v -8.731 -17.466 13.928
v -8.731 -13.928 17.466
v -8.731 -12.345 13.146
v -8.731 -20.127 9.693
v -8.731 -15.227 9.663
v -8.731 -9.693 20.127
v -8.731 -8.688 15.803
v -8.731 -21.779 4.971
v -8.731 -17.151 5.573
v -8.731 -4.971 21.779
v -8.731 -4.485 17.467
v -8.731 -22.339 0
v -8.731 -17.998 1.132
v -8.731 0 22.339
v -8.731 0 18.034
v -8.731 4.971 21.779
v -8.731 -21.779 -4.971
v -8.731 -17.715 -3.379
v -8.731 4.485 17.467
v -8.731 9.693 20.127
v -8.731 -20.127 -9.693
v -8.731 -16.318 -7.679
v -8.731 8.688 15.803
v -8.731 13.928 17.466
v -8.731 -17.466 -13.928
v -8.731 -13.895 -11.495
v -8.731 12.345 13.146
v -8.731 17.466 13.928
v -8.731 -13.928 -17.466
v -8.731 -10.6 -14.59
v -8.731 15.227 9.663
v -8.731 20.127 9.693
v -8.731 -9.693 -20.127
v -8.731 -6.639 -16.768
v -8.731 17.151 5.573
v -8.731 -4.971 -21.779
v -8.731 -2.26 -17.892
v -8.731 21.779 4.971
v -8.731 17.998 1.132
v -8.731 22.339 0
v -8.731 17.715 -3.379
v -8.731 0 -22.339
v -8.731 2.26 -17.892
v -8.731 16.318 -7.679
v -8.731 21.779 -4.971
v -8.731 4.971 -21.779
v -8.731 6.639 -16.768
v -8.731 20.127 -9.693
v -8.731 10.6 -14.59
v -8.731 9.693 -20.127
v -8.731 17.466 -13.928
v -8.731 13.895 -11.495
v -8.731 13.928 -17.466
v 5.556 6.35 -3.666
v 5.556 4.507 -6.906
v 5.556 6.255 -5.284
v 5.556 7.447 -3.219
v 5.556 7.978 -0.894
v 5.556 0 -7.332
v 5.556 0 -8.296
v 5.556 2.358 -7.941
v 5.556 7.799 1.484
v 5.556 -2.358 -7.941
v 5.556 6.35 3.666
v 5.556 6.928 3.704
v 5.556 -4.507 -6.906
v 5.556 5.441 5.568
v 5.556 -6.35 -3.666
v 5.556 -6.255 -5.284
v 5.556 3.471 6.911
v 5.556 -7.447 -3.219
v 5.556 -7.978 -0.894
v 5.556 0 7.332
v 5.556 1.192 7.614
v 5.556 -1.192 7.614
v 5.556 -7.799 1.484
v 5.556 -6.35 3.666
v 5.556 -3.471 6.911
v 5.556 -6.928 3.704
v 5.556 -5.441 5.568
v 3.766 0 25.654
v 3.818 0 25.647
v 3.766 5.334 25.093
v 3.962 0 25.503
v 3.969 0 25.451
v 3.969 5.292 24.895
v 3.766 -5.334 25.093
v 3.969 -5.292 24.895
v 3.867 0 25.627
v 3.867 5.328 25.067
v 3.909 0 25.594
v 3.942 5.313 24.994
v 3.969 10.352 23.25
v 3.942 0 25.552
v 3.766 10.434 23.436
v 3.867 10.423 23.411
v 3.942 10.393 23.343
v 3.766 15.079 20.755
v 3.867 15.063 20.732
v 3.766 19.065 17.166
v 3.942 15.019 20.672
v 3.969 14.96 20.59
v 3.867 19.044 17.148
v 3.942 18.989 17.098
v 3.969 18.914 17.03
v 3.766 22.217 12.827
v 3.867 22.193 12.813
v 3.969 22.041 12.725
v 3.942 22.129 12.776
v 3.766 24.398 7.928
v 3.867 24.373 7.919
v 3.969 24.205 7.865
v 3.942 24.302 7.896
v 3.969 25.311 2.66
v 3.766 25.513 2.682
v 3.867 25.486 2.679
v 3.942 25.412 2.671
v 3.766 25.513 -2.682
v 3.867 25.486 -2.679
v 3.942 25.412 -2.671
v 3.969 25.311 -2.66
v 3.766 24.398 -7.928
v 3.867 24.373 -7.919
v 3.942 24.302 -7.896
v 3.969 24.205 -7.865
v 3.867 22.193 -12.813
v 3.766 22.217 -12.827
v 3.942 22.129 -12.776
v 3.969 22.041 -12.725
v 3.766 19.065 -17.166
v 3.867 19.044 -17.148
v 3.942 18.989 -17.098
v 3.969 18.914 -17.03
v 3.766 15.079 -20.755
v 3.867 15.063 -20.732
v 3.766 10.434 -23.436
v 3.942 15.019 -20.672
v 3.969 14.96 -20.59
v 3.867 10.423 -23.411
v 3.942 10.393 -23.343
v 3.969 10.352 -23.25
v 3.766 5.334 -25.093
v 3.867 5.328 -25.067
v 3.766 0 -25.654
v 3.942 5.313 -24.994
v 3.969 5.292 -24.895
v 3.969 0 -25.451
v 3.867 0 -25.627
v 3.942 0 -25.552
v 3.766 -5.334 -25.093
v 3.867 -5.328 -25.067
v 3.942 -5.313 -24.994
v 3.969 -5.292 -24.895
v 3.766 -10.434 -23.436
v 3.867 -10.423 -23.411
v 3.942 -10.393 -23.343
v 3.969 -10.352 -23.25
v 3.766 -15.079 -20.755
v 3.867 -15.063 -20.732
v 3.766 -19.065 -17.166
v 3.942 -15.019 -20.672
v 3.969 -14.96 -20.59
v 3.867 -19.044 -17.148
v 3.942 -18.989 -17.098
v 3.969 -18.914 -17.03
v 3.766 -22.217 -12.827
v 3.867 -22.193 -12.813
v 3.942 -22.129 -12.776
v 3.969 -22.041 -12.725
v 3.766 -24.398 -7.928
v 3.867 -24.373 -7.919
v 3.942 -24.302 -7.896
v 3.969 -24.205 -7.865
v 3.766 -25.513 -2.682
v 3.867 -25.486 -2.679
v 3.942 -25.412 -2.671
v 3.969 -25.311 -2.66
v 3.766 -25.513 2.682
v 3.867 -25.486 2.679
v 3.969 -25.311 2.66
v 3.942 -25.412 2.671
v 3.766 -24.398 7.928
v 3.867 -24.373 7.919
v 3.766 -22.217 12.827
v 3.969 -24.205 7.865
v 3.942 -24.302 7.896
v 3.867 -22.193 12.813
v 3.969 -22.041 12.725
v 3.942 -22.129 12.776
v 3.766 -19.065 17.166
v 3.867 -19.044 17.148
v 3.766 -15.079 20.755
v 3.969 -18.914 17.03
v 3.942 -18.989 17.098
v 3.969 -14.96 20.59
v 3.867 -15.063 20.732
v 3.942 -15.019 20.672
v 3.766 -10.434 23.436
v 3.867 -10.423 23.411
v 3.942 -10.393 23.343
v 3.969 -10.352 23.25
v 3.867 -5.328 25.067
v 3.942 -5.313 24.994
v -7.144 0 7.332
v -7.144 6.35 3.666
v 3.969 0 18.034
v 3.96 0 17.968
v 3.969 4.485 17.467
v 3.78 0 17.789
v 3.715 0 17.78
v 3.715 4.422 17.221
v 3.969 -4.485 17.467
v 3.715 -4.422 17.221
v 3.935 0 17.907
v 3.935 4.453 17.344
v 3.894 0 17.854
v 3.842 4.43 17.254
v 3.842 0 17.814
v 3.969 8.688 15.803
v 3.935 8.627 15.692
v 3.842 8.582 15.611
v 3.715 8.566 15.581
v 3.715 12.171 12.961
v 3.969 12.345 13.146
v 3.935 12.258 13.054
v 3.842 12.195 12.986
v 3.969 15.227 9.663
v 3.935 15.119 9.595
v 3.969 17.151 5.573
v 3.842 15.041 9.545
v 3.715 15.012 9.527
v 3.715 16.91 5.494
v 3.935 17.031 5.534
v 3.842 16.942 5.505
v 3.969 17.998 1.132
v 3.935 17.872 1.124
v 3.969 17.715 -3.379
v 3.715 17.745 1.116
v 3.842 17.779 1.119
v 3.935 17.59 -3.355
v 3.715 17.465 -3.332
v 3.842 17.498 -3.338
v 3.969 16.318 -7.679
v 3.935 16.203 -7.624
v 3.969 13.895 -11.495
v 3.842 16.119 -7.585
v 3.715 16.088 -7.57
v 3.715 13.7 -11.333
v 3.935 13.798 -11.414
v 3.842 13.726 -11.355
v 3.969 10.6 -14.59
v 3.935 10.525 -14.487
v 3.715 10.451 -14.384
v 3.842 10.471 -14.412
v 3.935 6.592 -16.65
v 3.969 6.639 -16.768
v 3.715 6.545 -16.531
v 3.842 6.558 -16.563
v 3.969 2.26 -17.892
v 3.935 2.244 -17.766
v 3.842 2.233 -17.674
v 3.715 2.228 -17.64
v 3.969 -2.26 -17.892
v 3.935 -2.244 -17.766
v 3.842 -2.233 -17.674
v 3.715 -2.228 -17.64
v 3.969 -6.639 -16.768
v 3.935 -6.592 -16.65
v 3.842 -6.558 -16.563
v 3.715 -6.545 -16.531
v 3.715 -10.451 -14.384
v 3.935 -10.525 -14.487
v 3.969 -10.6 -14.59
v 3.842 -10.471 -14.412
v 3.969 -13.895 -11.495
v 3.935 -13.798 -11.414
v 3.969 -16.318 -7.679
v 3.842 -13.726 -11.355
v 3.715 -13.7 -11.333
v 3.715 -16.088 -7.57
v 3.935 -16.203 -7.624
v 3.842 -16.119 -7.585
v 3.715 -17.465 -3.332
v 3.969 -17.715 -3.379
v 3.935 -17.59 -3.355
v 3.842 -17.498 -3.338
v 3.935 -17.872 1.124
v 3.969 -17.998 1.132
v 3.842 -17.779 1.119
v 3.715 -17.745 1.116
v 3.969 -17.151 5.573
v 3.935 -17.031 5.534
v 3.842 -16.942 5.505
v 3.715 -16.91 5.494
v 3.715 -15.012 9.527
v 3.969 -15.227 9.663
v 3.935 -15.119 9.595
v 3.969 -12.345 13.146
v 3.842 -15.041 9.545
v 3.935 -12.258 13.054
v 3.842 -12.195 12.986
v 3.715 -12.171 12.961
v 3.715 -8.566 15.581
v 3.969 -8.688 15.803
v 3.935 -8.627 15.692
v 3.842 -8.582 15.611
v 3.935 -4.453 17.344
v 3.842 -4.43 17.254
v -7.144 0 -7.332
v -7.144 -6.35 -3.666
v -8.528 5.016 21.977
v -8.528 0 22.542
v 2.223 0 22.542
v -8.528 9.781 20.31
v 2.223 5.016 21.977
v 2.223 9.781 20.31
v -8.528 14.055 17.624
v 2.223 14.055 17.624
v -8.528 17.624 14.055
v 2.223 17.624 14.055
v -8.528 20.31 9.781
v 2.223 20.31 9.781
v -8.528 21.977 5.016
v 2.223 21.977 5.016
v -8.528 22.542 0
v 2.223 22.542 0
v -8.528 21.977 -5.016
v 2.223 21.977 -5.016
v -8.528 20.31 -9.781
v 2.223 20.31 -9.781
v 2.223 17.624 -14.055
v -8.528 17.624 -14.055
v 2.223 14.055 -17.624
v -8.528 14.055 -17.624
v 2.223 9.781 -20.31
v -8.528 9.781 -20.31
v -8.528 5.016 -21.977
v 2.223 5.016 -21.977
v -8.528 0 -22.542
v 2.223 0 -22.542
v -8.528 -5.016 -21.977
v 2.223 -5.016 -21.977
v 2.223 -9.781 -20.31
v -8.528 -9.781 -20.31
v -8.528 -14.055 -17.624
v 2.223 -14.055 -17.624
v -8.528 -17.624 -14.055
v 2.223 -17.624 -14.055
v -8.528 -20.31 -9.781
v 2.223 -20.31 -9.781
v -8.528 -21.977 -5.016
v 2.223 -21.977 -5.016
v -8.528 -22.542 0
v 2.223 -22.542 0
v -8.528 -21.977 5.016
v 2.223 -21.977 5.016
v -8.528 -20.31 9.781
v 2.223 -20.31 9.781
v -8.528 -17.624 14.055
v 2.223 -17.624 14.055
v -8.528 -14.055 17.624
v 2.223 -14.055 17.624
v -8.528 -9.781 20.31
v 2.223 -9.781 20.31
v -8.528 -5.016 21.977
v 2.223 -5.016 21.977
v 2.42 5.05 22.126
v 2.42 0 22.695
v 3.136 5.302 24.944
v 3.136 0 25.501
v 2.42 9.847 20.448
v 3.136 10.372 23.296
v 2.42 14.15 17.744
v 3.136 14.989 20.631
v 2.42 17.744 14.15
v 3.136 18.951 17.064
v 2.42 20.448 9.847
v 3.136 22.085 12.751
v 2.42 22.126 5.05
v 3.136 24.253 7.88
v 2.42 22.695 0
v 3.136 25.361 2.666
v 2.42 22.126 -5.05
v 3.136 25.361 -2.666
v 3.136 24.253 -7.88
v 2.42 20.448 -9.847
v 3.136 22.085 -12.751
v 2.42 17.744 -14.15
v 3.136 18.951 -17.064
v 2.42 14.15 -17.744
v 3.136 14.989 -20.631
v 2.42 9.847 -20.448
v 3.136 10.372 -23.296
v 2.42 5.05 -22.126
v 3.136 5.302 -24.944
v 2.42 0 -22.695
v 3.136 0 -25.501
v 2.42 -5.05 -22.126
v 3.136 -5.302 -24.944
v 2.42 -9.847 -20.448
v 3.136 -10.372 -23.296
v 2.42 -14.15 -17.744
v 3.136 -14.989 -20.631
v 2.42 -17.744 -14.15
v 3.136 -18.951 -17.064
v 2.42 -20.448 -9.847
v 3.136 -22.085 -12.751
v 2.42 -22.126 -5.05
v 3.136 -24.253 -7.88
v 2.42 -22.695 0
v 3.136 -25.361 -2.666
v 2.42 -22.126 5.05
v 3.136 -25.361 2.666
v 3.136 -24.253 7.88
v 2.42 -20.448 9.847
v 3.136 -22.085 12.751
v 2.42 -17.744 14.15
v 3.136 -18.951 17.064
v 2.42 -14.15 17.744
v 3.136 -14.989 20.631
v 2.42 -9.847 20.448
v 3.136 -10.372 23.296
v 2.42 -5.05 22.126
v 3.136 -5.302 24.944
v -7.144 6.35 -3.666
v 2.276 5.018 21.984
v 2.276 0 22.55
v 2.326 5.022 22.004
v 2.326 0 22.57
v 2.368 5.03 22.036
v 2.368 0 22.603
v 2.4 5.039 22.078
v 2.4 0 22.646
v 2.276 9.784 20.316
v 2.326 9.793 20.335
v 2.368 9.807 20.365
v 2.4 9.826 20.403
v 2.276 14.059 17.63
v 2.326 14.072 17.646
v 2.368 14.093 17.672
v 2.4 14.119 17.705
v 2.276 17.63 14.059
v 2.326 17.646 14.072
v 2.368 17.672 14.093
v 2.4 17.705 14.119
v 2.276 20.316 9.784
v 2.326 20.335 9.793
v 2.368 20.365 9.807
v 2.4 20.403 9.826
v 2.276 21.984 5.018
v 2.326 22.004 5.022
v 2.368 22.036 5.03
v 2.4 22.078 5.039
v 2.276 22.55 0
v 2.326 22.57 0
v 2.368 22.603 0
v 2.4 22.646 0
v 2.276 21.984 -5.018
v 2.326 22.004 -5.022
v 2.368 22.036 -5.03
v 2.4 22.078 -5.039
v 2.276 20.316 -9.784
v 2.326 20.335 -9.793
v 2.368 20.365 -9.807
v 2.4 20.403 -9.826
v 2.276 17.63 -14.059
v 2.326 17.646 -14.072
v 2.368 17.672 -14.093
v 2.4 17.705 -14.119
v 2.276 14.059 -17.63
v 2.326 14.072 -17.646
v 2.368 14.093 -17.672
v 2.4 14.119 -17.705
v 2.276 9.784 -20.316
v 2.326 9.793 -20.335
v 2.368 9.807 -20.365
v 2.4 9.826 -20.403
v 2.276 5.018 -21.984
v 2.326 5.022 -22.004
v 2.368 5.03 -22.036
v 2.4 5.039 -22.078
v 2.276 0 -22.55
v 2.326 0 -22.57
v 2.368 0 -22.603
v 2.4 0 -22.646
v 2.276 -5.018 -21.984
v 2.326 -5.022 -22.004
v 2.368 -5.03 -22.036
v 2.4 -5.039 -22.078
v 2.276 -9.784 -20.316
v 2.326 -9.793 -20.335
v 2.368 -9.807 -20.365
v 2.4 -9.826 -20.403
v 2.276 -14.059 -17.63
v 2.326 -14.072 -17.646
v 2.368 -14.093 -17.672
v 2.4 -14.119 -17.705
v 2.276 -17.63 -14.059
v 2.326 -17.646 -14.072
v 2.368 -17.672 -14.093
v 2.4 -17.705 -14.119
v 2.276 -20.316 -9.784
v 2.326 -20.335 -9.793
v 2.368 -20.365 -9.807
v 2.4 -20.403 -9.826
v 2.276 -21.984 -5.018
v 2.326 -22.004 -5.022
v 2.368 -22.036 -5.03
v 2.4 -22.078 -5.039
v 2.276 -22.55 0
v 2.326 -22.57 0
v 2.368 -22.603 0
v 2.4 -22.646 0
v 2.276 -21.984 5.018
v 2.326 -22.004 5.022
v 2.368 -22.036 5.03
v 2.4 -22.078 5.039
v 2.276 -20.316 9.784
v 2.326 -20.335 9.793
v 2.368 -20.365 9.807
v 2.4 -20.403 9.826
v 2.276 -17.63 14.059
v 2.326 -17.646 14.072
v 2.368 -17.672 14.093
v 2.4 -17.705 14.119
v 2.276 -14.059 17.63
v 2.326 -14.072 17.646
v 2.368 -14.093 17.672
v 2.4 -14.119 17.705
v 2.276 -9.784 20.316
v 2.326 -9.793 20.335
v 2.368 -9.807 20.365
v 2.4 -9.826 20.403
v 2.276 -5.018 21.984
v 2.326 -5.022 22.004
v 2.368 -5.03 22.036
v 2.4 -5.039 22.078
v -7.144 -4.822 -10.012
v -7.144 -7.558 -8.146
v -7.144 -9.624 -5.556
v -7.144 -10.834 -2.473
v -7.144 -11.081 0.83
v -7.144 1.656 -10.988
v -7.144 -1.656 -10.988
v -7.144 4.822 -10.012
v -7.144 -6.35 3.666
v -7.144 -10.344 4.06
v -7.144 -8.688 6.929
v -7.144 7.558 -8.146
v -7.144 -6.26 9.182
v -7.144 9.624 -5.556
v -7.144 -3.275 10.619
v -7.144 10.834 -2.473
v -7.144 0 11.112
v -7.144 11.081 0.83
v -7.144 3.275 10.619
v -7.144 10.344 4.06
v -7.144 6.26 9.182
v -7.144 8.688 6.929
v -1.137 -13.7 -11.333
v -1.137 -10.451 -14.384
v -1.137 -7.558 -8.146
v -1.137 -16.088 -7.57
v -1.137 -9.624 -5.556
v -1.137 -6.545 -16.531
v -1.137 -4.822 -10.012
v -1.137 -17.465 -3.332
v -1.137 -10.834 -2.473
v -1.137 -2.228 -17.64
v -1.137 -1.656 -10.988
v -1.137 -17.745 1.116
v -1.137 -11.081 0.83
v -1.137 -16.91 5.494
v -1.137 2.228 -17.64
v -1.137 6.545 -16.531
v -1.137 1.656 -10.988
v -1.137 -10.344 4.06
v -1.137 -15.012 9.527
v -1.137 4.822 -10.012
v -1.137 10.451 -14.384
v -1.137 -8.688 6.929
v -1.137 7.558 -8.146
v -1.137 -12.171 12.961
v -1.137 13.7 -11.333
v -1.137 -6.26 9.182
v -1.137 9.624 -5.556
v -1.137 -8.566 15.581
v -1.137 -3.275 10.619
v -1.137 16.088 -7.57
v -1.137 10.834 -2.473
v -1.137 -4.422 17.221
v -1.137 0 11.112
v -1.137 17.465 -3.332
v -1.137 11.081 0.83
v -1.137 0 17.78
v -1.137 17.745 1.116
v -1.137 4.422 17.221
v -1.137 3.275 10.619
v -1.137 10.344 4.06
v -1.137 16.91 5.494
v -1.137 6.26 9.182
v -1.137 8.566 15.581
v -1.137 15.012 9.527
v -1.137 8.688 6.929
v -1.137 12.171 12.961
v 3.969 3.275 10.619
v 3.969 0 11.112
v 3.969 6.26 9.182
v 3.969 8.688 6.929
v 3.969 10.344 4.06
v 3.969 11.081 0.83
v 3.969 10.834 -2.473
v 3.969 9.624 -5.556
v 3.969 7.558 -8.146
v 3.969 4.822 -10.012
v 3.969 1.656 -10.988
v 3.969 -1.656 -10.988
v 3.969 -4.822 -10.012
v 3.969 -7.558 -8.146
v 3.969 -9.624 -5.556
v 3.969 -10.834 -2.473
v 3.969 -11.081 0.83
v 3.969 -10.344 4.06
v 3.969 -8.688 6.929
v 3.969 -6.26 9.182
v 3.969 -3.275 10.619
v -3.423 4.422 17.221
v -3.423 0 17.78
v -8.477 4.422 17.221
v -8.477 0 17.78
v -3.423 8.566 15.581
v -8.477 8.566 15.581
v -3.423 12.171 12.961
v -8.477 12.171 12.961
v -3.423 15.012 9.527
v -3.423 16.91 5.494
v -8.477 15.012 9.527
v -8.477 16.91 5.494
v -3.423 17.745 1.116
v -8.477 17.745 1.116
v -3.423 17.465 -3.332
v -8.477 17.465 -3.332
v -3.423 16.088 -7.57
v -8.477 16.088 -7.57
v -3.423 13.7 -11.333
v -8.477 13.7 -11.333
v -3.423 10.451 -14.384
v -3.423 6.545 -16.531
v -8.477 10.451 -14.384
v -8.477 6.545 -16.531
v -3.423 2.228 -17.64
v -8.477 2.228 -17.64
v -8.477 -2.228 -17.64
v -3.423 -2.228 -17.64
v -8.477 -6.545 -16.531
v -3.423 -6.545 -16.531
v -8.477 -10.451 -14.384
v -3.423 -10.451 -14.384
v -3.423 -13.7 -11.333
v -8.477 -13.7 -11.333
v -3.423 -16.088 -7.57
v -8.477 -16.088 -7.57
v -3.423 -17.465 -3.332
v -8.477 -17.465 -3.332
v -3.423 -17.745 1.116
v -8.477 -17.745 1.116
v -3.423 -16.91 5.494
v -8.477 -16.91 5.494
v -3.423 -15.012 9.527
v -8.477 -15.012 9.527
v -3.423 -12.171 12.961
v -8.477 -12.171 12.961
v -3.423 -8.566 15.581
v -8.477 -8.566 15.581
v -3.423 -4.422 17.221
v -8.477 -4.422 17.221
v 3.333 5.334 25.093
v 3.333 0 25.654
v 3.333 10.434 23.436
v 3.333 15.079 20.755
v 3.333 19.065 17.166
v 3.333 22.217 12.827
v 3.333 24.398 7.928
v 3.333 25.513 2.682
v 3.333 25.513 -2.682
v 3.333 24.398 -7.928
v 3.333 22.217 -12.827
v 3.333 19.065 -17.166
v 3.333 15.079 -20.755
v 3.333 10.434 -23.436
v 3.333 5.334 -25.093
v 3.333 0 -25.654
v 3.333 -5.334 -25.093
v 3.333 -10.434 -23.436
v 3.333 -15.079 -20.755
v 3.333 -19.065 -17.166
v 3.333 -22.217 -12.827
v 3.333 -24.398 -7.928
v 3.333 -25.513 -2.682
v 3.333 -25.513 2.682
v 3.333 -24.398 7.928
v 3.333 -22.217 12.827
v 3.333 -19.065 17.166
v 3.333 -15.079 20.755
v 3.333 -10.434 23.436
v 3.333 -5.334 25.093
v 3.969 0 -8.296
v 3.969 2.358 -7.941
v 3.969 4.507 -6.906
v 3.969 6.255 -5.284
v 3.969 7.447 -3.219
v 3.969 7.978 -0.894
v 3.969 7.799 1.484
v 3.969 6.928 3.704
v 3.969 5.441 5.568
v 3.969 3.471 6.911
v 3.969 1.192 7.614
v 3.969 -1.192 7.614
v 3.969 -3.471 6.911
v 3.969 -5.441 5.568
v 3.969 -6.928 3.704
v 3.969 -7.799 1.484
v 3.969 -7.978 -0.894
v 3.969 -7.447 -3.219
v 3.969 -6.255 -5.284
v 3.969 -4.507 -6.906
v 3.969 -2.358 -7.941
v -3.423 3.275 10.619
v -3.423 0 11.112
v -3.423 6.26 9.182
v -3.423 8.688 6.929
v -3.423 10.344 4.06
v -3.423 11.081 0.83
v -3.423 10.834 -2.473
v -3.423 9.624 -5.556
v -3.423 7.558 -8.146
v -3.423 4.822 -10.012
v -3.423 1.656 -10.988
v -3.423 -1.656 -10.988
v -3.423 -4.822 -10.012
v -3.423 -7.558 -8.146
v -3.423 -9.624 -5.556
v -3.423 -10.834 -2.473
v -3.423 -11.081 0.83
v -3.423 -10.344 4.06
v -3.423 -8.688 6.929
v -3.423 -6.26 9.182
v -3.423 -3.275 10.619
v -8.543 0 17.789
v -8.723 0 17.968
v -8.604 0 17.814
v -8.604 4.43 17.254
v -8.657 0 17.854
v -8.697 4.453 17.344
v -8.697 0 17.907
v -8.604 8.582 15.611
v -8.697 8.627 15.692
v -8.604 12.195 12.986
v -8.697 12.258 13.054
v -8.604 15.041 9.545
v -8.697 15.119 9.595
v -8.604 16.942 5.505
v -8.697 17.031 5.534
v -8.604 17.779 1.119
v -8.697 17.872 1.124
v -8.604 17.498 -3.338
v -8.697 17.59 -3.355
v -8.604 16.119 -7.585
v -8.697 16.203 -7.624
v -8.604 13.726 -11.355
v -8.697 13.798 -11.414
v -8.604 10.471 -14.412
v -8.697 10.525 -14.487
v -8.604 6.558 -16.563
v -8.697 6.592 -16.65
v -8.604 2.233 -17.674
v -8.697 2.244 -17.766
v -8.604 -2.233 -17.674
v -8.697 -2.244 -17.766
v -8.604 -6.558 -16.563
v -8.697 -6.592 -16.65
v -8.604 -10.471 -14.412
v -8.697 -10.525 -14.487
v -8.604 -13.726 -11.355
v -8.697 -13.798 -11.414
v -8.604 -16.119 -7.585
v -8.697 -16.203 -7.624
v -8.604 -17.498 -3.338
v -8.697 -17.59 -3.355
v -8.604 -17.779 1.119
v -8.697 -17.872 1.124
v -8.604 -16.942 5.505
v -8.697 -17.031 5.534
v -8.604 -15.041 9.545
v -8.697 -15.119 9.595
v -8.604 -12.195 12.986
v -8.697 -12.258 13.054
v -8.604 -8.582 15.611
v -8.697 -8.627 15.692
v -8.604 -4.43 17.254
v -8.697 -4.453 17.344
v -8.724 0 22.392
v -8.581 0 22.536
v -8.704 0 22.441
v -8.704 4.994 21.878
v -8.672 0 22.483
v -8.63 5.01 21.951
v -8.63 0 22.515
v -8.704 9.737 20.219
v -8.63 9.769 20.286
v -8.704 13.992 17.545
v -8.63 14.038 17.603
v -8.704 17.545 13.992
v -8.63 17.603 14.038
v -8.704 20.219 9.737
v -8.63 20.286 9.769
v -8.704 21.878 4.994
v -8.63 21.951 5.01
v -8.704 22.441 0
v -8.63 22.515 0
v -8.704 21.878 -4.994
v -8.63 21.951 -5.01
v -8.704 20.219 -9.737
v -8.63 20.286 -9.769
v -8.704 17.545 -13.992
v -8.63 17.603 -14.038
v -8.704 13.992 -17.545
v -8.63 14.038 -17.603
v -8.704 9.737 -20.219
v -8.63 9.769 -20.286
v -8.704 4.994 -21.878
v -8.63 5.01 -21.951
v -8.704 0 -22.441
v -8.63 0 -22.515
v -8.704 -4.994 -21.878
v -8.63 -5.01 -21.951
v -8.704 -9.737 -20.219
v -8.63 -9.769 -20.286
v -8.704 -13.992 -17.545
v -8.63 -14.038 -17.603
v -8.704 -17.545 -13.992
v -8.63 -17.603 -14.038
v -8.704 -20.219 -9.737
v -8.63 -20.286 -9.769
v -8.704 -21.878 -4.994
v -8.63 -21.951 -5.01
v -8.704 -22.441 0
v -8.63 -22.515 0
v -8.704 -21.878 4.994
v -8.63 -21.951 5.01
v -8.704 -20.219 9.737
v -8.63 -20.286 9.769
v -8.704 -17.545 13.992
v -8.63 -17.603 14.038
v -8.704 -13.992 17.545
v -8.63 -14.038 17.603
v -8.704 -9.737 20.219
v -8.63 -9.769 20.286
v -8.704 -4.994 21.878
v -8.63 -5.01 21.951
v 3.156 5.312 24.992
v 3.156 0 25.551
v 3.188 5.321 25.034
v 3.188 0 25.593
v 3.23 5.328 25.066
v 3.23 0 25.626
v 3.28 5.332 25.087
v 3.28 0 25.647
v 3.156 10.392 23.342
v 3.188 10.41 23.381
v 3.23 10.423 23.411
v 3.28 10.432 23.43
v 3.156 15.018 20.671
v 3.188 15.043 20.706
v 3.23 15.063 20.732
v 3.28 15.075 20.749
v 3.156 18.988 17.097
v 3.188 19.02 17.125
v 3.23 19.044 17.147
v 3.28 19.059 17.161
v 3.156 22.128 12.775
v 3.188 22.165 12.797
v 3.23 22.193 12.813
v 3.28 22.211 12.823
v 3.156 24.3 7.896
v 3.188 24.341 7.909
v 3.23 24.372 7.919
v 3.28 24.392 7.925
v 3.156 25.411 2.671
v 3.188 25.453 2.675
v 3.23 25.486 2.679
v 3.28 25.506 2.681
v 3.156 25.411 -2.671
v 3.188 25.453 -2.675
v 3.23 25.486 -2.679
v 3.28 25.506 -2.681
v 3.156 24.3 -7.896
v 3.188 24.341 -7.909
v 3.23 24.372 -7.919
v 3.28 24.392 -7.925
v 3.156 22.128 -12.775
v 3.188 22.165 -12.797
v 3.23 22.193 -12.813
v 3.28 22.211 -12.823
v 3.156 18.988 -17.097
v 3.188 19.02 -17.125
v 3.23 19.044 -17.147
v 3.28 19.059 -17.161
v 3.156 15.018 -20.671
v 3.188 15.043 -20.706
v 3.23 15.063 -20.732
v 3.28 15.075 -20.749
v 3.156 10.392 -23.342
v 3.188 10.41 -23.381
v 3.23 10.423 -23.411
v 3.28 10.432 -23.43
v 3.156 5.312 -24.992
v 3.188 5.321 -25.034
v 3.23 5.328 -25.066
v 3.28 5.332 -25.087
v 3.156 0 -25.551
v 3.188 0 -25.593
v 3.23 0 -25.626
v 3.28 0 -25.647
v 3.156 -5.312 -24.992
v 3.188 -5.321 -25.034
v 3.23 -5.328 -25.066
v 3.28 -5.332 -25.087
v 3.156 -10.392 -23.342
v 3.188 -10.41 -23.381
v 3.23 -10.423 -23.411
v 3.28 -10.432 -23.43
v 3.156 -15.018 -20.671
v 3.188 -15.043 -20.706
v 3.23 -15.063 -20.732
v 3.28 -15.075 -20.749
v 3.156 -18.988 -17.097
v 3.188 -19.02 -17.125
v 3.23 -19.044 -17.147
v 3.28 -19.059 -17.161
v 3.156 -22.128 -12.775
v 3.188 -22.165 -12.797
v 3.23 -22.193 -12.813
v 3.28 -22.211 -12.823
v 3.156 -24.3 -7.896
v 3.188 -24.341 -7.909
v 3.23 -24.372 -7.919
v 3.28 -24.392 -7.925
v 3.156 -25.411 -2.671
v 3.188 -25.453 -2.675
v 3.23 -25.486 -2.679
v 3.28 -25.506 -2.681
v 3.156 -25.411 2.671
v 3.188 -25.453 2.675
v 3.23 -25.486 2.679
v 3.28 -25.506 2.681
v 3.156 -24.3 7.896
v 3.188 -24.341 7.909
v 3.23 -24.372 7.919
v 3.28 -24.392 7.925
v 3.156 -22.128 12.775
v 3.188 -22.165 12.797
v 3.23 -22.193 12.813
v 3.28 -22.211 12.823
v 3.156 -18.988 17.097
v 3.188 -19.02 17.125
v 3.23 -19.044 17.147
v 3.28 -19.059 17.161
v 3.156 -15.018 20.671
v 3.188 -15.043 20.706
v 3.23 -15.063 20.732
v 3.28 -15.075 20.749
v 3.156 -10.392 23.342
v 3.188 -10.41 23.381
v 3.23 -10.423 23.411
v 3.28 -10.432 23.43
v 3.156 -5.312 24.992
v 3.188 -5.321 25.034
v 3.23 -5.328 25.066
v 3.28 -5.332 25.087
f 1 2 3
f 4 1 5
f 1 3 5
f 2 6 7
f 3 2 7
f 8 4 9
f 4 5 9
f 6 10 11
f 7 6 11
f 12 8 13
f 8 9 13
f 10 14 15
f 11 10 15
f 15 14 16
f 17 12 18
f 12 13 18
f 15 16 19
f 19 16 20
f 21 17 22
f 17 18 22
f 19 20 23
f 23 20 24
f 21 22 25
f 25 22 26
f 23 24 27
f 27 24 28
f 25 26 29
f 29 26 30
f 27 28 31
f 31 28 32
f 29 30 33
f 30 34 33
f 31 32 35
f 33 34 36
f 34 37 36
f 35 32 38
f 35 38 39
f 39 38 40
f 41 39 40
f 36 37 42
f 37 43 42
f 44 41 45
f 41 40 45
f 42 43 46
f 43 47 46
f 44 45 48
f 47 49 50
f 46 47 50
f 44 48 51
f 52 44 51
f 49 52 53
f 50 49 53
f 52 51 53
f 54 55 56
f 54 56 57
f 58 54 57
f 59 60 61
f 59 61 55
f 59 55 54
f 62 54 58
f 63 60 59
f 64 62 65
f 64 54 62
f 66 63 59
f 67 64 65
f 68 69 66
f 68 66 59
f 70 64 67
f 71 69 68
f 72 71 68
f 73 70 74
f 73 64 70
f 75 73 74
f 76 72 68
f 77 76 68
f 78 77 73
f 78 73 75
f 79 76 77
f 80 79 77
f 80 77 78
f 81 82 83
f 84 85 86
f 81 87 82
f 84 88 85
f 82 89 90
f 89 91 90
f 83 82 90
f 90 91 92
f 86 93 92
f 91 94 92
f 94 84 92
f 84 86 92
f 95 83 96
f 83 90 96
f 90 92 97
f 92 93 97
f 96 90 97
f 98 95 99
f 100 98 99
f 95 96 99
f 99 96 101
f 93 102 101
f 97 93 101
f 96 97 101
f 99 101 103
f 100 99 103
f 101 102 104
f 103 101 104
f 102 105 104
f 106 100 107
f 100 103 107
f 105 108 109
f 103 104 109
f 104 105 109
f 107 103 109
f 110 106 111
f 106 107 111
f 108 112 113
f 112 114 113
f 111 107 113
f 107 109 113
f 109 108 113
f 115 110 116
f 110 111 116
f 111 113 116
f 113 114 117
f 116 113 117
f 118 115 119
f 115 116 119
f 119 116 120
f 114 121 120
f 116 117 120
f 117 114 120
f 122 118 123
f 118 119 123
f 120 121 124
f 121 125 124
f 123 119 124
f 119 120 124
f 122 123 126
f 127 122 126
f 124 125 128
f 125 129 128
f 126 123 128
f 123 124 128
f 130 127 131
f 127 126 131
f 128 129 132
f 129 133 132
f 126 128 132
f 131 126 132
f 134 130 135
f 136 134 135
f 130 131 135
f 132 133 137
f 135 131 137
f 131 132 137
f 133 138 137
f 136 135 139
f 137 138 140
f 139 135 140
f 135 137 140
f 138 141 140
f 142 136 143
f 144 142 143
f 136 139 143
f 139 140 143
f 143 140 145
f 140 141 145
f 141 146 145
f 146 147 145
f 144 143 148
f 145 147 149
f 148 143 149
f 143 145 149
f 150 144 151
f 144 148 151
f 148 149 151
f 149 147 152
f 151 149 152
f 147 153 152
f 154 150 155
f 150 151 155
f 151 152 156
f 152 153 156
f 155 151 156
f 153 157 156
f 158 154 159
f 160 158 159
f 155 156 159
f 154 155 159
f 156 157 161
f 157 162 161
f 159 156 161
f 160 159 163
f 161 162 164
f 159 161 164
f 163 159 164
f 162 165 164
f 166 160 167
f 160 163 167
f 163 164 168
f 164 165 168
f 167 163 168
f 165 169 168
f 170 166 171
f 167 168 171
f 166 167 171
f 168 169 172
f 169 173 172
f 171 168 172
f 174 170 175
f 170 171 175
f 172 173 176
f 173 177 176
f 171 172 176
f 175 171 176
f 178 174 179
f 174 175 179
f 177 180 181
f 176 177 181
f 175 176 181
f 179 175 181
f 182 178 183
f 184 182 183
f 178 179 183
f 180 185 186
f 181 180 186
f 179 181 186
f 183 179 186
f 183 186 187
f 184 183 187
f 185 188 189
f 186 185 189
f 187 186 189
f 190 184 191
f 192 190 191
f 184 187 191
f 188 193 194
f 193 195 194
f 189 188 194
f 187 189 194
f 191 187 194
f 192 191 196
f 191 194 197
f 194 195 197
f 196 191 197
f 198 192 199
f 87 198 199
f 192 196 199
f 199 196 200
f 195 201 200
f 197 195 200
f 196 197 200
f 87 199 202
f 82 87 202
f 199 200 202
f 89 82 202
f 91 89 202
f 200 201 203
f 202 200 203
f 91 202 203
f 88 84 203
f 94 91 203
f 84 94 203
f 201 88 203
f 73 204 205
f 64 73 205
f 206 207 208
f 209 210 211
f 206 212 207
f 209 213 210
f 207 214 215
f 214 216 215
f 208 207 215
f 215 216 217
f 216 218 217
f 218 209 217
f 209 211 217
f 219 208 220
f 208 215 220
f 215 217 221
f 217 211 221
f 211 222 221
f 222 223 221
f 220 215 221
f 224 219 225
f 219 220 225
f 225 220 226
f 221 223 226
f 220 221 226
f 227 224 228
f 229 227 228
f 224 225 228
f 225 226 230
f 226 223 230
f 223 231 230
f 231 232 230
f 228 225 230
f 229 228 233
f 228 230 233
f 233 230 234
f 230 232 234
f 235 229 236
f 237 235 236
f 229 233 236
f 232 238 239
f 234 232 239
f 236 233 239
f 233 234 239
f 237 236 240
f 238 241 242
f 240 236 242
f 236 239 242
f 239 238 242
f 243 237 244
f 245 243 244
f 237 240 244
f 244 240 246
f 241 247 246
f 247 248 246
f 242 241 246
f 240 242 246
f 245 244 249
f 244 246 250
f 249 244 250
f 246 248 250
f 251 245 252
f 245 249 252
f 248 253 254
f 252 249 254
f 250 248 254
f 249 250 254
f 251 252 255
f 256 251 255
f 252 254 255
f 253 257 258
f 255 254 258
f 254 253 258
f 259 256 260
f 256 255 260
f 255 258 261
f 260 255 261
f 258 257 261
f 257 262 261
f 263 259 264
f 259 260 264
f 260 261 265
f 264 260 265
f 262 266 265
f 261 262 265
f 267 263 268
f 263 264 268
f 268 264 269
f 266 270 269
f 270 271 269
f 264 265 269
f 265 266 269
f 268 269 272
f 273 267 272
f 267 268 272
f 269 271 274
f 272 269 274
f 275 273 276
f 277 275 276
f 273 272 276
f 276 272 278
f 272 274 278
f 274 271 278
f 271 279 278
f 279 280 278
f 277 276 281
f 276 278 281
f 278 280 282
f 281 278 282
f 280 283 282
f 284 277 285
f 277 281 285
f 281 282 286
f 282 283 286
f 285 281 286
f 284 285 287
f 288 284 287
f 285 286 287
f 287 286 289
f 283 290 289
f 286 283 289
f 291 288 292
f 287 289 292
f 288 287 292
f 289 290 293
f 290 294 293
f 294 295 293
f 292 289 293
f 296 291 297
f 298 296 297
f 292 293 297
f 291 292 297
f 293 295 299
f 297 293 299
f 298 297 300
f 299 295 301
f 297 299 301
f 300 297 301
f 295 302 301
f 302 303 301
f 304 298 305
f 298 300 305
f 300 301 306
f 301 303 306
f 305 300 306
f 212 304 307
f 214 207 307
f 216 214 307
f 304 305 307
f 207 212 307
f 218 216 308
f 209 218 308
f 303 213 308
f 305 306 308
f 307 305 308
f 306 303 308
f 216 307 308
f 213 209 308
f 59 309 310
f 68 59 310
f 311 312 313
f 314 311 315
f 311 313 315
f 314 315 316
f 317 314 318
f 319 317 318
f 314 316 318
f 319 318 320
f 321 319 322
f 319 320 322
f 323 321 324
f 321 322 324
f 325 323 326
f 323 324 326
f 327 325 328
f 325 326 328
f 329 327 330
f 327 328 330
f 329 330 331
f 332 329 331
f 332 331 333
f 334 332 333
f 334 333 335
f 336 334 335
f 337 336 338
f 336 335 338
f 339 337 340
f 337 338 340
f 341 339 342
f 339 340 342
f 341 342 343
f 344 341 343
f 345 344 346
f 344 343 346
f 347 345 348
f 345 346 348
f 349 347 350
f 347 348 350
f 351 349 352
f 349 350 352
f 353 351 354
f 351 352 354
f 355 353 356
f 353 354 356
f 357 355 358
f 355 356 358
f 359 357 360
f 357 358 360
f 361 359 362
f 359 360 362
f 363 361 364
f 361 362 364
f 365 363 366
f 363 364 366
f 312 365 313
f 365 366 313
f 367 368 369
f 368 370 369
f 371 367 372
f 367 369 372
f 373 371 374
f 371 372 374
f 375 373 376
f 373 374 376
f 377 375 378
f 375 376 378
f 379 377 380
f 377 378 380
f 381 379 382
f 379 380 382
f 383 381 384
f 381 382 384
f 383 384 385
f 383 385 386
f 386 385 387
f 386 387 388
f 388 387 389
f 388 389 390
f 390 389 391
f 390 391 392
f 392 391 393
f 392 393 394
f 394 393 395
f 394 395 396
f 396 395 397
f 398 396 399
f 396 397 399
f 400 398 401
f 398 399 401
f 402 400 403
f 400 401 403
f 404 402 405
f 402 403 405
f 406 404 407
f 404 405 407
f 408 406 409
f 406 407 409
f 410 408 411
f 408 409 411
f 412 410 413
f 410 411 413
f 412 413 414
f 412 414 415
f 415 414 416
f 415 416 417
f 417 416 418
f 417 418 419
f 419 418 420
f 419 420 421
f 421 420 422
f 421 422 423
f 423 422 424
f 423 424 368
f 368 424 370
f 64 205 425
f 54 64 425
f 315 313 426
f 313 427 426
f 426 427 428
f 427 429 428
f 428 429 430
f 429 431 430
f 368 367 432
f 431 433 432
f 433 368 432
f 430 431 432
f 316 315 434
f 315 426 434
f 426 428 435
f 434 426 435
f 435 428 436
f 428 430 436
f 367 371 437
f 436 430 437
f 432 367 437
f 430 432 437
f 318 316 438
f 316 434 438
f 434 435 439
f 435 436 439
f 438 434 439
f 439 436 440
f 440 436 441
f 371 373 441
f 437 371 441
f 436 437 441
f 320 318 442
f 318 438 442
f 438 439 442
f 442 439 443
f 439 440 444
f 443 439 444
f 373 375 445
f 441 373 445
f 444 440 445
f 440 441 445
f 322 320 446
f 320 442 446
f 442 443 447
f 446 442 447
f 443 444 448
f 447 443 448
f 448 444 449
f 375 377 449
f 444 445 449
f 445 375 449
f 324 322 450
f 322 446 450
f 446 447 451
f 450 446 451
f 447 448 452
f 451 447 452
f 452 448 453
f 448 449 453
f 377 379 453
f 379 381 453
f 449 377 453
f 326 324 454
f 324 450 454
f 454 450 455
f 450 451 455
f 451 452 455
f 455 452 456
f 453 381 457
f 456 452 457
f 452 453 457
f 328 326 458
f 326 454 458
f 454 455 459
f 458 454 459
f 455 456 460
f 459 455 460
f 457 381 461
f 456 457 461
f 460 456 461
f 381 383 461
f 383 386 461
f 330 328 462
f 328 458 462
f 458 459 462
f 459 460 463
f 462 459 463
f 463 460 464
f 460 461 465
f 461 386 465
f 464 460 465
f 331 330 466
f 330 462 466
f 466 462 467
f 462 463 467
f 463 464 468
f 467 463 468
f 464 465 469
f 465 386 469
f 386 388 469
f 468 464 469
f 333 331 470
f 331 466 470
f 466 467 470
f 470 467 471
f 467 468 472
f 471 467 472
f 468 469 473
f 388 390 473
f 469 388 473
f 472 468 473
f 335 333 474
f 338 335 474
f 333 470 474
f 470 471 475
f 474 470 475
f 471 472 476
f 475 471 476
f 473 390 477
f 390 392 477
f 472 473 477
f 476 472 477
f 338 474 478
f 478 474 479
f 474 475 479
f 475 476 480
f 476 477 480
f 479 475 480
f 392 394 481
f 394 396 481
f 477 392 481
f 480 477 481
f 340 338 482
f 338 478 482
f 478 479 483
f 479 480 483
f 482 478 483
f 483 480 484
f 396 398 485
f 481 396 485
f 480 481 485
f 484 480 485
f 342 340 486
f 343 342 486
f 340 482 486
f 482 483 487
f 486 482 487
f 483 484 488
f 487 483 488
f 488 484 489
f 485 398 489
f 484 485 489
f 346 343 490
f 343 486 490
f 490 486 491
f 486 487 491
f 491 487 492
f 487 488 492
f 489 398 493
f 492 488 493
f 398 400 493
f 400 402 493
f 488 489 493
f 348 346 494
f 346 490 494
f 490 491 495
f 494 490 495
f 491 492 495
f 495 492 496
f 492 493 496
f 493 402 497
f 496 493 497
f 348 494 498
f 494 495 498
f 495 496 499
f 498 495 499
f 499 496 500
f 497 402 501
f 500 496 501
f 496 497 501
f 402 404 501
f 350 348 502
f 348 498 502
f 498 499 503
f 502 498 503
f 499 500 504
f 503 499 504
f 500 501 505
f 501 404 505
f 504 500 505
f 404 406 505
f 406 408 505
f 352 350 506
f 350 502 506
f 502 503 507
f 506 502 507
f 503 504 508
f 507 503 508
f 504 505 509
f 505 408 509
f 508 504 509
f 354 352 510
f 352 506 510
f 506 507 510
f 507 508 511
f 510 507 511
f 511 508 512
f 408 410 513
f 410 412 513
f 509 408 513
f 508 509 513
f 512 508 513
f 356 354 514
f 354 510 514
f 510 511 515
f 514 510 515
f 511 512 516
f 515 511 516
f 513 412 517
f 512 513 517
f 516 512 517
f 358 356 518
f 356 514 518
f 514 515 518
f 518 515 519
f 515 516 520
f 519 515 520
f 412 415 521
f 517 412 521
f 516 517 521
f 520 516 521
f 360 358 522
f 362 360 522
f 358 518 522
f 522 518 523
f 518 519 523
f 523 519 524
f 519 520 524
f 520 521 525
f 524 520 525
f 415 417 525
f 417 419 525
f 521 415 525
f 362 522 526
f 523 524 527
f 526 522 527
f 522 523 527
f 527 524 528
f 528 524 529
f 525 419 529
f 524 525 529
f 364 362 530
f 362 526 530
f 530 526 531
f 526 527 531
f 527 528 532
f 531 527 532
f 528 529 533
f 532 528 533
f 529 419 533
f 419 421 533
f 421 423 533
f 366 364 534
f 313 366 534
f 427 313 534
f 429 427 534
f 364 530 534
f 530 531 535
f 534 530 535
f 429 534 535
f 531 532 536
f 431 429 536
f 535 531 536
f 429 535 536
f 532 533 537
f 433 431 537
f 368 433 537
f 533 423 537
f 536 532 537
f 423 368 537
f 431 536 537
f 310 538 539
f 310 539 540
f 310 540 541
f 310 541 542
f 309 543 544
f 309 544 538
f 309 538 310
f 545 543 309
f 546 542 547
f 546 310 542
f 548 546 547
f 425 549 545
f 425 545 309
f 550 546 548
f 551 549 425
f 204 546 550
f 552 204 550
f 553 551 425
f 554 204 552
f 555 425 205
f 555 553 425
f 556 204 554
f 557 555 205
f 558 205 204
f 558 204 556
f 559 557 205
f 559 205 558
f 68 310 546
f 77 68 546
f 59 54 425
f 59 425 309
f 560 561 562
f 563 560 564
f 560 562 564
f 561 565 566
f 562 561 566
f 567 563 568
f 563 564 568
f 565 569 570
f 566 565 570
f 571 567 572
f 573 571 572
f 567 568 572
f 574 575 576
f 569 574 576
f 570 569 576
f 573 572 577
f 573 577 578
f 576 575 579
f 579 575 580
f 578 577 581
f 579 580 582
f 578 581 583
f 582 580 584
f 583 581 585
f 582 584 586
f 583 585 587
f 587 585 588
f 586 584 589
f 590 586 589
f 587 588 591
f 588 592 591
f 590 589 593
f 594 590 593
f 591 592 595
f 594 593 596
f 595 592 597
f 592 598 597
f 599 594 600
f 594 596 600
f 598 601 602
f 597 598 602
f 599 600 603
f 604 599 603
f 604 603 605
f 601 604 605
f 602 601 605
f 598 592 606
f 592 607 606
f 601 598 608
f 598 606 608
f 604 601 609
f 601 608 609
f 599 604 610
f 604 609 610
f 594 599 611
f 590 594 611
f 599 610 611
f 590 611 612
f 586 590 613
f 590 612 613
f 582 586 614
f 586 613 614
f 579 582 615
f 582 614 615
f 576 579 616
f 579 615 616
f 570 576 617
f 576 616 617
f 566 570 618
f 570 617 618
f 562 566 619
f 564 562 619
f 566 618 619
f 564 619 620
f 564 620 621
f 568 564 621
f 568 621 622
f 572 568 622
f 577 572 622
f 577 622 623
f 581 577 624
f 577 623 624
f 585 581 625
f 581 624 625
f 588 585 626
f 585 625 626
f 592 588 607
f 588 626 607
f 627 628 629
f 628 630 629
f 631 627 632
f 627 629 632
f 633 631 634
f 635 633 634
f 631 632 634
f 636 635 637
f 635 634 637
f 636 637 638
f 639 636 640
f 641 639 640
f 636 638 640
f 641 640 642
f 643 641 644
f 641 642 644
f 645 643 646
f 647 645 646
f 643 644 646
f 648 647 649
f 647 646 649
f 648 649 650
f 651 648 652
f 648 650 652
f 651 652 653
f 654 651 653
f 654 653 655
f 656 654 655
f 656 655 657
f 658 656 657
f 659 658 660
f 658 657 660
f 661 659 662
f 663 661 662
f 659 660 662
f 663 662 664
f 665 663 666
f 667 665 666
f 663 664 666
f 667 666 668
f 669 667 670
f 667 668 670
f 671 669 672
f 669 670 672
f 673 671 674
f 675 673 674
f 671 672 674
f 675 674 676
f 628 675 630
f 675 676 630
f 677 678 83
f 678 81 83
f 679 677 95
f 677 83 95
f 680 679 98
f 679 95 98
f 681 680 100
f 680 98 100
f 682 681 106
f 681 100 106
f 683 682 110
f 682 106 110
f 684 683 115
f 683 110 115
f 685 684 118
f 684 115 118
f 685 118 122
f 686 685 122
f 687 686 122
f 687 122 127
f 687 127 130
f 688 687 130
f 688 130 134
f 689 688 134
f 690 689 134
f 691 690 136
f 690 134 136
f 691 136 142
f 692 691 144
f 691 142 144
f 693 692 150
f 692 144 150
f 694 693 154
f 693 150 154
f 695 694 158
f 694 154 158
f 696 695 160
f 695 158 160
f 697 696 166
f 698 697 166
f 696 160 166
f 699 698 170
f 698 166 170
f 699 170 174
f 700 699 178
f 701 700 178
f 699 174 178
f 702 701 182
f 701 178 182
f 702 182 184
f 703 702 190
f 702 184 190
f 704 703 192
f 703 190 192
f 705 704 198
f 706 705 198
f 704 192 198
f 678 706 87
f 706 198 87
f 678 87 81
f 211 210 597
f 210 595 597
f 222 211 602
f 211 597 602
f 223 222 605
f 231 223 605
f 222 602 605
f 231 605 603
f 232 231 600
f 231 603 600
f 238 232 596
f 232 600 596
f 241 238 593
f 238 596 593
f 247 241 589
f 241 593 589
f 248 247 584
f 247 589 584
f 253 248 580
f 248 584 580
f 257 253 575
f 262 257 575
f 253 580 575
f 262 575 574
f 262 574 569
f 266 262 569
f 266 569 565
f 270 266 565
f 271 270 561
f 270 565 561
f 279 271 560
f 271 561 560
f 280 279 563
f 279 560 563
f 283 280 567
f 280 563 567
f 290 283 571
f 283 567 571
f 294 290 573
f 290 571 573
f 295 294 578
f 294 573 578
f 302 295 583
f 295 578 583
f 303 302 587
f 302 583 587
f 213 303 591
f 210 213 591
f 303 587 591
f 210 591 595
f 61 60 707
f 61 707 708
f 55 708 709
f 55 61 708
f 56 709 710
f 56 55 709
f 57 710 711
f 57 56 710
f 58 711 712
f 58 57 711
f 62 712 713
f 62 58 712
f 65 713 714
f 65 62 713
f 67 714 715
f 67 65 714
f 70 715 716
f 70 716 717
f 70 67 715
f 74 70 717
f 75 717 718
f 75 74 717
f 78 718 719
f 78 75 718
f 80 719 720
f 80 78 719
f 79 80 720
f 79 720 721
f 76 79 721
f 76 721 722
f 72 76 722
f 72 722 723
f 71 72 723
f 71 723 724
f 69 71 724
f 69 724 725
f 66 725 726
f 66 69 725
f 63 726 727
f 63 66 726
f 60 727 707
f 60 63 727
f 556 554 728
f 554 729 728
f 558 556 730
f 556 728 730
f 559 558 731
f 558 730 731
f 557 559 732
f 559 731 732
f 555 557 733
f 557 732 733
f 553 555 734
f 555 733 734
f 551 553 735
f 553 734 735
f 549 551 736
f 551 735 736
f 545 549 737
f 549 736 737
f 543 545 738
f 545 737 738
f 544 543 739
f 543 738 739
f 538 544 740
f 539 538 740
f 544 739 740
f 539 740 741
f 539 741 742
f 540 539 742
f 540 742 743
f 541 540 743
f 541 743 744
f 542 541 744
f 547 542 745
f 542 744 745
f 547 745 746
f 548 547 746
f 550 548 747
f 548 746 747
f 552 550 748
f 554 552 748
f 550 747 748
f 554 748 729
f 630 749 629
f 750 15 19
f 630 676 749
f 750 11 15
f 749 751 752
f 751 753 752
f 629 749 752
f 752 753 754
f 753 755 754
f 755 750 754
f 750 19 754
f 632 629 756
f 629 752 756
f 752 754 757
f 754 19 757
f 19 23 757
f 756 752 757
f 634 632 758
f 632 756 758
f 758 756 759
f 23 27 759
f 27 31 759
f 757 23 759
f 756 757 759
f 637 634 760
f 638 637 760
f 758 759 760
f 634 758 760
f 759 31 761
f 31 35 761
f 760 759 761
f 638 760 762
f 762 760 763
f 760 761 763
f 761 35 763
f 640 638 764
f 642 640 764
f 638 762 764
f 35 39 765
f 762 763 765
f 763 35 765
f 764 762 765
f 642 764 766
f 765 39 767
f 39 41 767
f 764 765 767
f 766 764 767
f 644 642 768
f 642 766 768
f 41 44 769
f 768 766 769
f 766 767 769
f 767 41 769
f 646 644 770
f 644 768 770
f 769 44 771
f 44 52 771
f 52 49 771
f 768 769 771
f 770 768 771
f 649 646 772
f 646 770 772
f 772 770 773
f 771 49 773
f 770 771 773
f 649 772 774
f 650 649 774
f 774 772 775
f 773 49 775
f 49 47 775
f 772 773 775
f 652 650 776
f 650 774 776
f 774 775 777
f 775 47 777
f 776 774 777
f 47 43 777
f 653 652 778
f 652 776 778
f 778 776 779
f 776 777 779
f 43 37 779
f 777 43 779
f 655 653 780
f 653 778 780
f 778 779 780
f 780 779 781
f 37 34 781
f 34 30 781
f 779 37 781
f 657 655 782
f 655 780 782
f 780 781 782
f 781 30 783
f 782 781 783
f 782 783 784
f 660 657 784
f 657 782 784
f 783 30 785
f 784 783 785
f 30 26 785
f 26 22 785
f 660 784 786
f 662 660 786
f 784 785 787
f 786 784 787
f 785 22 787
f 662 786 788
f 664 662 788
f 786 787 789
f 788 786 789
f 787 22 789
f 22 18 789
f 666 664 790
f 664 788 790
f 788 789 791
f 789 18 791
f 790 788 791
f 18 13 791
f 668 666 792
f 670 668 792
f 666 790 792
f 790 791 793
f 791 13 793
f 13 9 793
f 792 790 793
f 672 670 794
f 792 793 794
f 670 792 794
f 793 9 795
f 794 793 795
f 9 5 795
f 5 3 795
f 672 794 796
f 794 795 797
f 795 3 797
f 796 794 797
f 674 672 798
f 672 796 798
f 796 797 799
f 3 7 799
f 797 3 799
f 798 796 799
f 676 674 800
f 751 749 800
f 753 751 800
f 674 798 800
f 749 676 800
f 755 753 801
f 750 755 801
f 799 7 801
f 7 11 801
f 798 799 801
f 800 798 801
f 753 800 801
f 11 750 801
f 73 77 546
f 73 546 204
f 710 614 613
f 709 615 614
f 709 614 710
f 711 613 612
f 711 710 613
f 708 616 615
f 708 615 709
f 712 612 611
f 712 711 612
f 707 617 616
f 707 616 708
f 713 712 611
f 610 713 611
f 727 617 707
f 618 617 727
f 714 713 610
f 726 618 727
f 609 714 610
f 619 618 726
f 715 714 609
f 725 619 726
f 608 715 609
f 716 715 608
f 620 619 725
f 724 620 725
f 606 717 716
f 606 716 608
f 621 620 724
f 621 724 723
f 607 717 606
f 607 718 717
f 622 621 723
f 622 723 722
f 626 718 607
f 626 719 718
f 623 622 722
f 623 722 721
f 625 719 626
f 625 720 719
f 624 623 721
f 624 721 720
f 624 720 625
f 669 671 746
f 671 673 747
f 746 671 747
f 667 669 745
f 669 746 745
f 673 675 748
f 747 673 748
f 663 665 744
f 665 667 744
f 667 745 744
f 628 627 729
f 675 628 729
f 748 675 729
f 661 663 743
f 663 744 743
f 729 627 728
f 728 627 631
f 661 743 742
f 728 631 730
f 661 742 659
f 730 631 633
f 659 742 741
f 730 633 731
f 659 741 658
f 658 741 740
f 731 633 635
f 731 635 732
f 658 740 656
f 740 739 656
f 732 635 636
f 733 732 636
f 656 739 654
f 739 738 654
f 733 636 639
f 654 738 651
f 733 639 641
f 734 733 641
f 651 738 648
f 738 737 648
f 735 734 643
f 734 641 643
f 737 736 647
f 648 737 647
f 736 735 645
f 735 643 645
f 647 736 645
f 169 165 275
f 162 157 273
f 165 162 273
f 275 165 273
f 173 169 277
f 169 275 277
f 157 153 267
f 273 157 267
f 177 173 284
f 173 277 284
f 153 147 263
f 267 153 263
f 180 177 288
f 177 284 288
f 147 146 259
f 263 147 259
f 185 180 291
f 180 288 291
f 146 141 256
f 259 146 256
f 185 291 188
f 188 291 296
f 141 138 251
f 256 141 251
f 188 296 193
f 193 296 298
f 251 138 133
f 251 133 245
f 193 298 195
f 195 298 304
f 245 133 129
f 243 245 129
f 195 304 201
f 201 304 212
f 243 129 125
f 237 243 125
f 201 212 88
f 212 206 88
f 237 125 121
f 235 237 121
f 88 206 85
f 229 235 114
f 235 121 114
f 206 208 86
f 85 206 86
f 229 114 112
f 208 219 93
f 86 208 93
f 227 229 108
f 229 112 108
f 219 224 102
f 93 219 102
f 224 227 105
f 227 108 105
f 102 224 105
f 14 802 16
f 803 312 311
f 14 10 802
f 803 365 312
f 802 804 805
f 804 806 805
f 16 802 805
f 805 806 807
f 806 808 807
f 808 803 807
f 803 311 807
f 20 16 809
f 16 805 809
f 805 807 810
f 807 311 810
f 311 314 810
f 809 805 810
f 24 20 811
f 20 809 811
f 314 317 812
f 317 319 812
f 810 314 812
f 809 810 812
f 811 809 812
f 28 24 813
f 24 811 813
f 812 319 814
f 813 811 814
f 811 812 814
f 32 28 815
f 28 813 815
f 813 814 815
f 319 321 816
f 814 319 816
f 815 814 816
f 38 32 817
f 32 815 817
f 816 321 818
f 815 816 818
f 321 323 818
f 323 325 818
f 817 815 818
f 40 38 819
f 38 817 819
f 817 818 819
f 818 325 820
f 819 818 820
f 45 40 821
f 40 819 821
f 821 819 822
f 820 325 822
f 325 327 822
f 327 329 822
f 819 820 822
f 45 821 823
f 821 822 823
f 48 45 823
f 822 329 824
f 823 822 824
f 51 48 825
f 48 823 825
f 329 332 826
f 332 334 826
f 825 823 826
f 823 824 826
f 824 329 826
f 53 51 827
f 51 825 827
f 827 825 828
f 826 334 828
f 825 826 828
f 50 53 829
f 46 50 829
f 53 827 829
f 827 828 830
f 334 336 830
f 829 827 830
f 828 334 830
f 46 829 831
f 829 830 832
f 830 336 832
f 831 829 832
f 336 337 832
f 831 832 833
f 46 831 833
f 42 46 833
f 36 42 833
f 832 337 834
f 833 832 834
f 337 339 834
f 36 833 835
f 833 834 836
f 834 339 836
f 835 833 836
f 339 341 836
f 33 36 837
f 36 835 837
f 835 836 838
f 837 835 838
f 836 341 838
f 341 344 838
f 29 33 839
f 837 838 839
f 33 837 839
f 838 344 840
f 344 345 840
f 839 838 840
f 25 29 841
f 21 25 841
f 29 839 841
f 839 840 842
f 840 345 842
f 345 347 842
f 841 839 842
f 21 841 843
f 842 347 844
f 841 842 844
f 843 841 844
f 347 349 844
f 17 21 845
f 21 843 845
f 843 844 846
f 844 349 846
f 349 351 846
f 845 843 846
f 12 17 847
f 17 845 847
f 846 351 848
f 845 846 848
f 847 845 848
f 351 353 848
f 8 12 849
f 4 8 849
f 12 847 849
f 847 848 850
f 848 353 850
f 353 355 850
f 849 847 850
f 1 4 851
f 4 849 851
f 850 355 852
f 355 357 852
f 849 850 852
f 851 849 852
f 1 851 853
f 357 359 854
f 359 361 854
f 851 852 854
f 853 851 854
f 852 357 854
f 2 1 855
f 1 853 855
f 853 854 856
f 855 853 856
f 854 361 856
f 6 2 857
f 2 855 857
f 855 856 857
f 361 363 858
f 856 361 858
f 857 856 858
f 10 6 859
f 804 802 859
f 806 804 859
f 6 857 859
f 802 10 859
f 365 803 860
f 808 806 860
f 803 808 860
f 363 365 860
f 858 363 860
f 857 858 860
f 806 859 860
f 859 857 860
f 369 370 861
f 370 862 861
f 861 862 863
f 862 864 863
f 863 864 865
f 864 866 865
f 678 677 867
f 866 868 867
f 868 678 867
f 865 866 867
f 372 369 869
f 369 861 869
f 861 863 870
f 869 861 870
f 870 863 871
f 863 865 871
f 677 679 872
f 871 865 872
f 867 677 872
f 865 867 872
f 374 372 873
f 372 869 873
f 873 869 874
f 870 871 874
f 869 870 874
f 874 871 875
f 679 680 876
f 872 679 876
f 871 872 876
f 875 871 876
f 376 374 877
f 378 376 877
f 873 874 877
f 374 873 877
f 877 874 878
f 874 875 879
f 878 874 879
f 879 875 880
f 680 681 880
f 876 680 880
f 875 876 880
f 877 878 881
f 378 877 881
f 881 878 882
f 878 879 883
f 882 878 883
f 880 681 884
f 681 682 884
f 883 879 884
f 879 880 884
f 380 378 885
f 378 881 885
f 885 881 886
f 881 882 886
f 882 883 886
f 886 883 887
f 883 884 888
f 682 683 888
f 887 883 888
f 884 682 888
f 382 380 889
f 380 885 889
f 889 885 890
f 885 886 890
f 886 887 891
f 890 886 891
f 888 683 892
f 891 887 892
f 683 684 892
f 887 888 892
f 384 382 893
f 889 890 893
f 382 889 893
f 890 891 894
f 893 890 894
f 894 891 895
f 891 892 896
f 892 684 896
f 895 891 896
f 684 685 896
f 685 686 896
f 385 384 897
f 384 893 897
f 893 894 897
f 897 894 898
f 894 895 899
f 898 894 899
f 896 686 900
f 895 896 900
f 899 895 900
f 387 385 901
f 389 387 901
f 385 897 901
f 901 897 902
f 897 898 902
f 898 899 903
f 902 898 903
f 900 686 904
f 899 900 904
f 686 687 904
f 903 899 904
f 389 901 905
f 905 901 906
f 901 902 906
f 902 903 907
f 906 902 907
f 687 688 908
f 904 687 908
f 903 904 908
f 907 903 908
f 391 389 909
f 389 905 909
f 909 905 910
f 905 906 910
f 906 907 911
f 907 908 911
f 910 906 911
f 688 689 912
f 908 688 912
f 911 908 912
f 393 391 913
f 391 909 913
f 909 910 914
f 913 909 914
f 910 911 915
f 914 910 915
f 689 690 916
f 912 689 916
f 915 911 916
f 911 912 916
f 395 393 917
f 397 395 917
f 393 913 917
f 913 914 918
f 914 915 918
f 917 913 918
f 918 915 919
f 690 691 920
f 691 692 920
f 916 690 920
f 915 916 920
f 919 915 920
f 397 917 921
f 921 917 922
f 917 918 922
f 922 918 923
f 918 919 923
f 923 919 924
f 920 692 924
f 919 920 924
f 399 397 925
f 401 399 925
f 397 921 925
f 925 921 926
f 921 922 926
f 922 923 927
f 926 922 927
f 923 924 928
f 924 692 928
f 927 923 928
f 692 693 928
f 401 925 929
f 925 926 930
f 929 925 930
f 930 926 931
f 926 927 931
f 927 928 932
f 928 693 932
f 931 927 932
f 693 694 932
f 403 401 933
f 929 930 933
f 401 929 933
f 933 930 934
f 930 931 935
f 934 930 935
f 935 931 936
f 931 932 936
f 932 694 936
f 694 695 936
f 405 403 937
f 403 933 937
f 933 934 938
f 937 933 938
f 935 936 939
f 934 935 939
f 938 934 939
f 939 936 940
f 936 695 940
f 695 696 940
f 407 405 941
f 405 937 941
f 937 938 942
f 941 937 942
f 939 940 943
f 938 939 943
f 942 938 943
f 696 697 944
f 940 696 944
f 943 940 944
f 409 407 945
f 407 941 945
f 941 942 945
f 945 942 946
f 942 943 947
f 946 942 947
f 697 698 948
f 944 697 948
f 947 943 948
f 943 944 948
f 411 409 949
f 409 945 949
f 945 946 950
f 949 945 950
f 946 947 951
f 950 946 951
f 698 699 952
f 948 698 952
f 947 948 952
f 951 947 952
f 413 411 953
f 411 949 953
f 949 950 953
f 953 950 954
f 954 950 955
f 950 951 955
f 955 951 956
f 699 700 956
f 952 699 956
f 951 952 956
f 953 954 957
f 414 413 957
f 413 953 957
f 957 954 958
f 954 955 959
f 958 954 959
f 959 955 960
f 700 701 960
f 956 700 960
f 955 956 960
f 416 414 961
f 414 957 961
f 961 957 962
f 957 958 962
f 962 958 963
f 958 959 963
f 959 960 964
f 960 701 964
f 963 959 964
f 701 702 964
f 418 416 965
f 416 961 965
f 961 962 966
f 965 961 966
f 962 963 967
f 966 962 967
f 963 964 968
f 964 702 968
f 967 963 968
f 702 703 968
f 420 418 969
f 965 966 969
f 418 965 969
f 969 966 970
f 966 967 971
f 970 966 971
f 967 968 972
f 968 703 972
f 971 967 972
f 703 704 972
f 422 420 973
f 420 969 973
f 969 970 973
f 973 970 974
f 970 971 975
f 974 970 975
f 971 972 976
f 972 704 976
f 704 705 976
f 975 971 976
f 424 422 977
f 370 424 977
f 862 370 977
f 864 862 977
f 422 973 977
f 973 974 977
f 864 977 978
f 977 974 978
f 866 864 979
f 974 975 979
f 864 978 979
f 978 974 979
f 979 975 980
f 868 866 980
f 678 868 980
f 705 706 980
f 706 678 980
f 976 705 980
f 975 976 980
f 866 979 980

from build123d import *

# Parameters (mm, degrees)
SKETCH2_R          = 11.1125
CUT_EXTRUDE1_DEPTH = 4.7625
CUT_EXTRUDE2_START = -3.175
SKETCH3_R          = 11.1125
CUT_EXTRUDE2_DEPTH = 3.175
CUT_EXTRUDE3_DEPTH = 39.438853223
SKETCH5_R          = 11.1125
SKETCH5_R_2        = 8
CUT_EXTRUDE4_DEPTH = 1.5875


with BuildPart() as part:
    # Sketch1 → Revolve1 (revolve)
    with BuildSketch(Plane(origin=(0, 0, 0), x_dir=(-1, 0, 0), z_dir=(0, 0, -1)), mode=Mode.PRIVATE) as revolve1_sk:
        with BuildLine():
            Line((8.47725, 11.1125), (3.42265, 11.1125))
            Line((3.42265, 11.1125), (3.42265, 17.78))
            Line((3.42265, 17.78), (8.47725, 17.78))
            ThreePointArc((8.47725, 17.78), (8.656855122, 17.854394878), (8.73125, 18.034))
            Line((8.73125, 18.034), (8.73125, 22.3393))
            ThreePointArc((8.73125, 22.3393), (8.671734098, 22.482984098), (8.52805, 22.5425))
            Line((8.52805, 22.5425), (-2.223379112, 22.5425))
            ThreePointArc((-2.223379112, 22.5425), (-2.348046432, 22.585237234), (-2.420273433, 22.695471857))
            Line((-2.420273433, 22.695471857), (-3.135976567, 25.501028143))
            ThreePointArc((-3.135976567, 25.501028143), (-3.208203568, 25.611262766), (-3.332870888, 25.654))
            Line((-3.332870888, 25.654), (-3.76555, 25.654))
            ThreePointArc((-3.76555, 25.654), (-3.909234098, 25.594484098), (-3.96875, 25.4508))
            Line((-3.96875, 25.4508), (-3.96875, 18.034))
            ThreePointArc((-3.96875, 18.034), (-3.894355122, 17.854394878), (-3.71475, 17.78))
            Line((-3.71475, 17.78), (1.13665, 17.78))
            Line((1.13665, 17.78), (1.13665, 11.1125))
            Line((1.13665, 11.1125), (-10.11555, 11.1125))
            ThreePointArc((-10.11555, 11.1125), (-10.259234098, 11.052984098), (-10.31875, 10.9093))
            Line((-10.31875, 10.9093), (-10.31875, 3.3782))
            ThreePointArc((-10.31875, 3.3782), (-10.259234098, 3.234515902), (-10.11555, 3.175))
            Line((-10.11555, 3.175), (10.11555, 3.175))
            ThreePointArc((10.11555, 3.175), (10.259234098, 3.234515902), (10.31875, 3.3782))
            Line((10.31875, 3.3782), (10.31875, 4.5593))
            ThreePointArc((10.31875, 4.5593), (10.259234098, 4.702984098), (10.11555, 4.7625))
            Line((10.11555, 4.7625), (8.73125, 4.7625))
            Line((8.73125, 4.7625), (8.73125, 10.8585))
            ThreePointArc((8.73125, 10.8585), (8.656855122, 11.038105122), (8.47725, 11.1125))
        make_face()
    revolve(revolve1_sk.sketch.rotate(Axis((10.322461745, 0, 0), (-1, 0, 0)), 270), axis=Axis((10.322461745, 0, 0), (-1, 0, 0)))

    # Sketch2 → Cut-Extrude1 (cut)
    with BuildSketch(Plane(origin=(10.31875, 0, 0), x_dir=(0, 0, -1), z_dir=(1, 0, 0))):
        with Locations(Location((0, 0, 0), (0, 0, 180))):
            Circle(SKETCH2_R)
    extrude(amount=-CUT_EXTRUDE1_DEPTH, mode=Mode.SUBTRACT)

    # Sketch3 → Cut-Extrude2 (cut)
    with BuildSketch(Plane.ZY.offset(10.31875).offset(CUT_EXTRUDE2_START)):
        Circle(SKETCH3_R)
    extrude(amount=CUT_EXTRUDE2_DEPTH, mode=Mode.SUBTRACT)

    # Sketch4 → Cut-Extrude3 (cut, through all)
    with BuildSketch(Plane.ZY.offset(7.14375)):
        Polygon((3.666174209, 6.35), (-3.666174209, 6.35), (-7.332348419, 0), (-3.666174209, -6.35), (3.666174209, -6.35), (7.332348419, 0), align=None)
    extrude(amount=-CUT_EXTRUDE3_DEPTH, mode=Mode.SUBTRACT)

    # Sketch5 → Cut-Extrude4 (cut)
    with BuildSketch(Plane(origin=(5.55625, 0, 0), x_dir=(0, 0, -1), z_dir=(1, 0, 0))):
        with Locations(Location((0, 0, 0), (0, 0, 180))):
            Circle(SKETCH5_R)
        with Locations((0.296341565, 0)):
            Circle(SKETCH5_R_2, mode=Mode.SUBTRACT)
    extrude(amount=-CUT_EXTRUDE4_DEPTH, mode=Mode.SUBTRACT)


solid = part.part
